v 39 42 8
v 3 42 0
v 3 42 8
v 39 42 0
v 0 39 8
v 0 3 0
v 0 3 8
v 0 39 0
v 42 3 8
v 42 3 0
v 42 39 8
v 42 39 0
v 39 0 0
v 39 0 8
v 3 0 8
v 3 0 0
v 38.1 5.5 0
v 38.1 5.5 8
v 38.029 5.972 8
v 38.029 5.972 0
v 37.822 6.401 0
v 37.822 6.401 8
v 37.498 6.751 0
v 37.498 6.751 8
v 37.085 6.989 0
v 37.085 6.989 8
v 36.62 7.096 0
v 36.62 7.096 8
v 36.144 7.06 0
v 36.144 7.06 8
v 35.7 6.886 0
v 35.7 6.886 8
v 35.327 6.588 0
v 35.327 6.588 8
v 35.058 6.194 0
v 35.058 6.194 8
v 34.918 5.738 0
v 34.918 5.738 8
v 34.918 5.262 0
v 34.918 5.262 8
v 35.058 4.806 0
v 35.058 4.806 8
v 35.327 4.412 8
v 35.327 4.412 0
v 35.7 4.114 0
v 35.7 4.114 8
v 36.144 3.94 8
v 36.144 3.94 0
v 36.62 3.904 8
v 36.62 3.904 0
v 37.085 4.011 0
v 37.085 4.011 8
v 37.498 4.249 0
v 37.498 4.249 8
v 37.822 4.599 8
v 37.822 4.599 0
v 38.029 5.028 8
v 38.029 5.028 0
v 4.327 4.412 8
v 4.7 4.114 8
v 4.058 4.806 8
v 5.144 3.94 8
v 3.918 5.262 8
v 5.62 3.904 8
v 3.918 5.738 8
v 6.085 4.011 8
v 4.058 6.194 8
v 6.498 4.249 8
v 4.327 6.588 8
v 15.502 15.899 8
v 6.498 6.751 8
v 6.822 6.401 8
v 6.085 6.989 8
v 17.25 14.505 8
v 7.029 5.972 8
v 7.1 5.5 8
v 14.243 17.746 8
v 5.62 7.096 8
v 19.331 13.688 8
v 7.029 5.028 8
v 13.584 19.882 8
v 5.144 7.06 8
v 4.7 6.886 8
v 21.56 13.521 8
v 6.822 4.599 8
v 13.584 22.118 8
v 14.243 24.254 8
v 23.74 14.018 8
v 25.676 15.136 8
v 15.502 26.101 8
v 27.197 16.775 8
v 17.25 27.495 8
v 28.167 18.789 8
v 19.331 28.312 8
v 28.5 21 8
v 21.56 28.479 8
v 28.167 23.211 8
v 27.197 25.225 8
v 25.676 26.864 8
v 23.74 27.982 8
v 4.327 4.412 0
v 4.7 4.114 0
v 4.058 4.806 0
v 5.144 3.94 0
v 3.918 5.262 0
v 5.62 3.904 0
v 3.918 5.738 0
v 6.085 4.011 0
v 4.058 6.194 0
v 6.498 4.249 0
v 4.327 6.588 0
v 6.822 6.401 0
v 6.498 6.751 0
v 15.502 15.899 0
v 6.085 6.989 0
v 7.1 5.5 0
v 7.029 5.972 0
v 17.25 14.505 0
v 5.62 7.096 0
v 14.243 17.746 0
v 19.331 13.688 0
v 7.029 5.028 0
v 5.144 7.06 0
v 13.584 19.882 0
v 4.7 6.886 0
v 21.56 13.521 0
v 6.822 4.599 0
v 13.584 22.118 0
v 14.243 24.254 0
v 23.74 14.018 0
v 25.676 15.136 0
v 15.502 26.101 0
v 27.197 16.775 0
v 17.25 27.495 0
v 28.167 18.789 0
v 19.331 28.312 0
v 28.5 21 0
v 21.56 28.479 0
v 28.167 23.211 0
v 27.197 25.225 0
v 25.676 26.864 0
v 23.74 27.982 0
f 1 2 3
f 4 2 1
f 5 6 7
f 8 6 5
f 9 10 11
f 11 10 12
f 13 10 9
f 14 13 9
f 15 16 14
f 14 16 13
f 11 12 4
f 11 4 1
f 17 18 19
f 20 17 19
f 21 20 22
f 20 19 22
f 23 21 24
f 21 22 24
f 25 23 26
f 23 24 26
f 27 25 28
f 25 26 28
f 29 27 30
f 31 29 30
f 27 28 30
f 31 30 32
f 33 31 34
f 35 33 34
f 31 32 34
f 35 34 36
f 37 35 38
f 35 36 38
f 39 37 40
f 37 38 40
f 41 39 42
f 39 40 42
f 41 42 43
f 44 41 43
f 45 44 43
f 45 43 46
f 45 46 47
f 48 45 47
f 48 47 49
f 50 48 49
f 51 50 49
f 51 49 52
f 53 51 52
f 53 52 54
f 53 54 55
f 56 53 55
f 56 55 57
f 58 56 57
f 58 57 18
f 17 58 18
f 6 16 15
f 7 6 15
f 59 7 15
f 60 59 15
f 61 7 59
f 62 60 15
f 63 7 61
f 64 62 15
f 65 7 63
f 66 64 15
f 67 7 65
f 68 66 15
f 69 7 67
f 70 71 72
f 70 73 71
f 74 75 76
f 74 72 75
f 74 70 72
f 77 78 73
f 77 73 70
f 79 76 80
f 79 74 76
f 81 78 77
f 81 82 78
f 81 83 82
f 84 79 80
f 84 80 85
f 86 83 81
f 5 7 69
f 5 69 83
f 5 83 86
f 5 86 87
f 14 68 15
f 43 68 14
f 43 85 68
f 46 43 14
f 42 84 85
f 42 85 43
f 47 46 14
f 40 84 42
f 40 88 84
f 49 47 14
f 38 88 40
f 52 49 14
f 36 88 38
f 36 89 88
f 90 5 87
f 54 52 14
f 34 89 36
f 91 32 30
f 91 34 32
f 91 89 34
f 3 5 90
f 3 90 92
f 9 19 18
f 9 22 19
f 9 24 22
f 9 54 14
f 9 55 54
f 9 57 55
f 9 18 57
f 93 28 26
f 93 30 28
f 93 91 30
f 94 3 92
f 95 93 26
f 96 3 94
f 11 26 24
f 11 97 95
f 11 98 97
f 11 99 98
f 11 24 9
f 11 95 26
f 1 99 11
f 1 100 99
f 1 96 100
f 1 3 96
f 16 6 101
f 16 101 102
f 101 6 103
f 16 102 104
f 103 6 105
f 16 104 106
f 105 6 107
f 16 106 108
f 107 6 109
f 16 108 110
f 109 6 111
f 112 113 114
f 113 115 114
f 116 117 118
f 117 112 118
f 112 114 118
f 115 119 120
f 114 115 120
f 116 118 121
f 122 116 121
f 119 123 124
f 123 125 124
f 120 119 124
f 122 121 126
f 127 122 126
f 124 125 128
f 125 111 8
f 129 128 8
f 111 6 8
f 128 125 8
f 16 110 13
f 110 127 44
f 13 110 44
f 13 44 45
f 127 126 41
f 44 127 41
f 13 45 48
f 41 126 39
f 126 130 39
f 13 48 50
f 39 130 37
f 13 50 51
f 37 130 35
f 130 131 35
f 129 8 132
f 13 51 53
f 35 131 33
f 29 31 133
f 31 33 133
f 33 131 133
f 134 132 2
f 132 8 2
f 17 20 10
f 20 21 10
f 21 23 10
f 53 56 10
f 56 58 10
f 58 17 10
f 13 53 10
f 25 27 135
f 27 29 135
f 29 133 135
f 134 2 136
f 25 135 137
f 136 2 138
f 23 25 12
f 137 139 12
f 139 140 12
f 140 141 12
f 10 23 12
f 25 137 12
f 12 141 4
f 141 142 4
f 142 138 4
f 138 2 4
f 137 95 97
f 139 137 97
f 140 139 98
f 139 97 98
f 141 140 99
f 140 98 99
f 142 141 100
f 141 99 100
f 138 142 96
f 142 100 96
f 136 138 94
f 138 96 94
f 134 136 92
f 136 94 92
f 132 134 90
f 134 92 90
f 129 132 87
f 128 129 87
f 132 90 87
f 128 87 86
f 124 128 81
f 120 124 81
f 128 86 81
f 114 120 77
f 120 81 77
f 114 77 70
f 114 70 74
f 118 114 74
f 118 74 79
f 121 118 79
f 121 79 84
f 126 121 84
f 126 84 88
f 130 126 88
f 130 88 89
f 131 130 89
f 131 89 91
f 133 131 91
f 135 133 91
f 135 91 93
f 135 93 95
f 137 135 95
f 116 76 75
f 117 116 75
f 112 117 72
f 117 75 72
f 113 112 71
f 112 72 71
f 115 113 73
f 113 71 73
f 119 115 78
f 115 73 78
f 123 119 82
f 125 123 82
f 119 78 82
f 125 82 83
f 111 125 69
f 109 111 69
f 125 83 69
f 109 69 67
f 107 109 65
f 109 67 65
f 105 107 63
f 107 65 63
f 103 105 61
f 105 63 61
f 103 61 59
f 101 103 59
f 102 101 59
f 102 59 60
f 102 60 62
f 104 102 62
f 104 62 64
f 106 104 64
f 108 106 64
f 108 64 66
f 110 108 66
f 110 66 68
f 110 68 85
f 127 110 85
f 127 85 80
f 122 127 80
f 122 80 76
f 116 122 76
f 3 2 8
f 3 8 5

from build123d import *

# Parameters (mm, degrees)
SKETCH1_W           = 42
SKETCH1_H           = 42
BOSS_EXTRUDE1_DEPTH = 8
SKETCH2_R           = 1.6
SKETCH2_R_2         = 7.5
CUT_EXTRUDE1_DEPTH  = 9
CHAMFER1_SIZE       = 3


with BuildPart() as part:
    # Sketch1 → Boss-Extrude1 (new body)
    with BuildSketch(Plane.XY):
        with Locations((21, 21)):
            Rectangle(SKETCH1_W, SKETCH1_H)
    extrude(amount=BOSS_EXTRUDE1_DEPTH)

    # Sketch2 → Cut-Extrude1 (cut)
    with BuildSketch(Plane.XY.offset(8)):
        with Locations((36.5, 5.5)):
            Circle(SKETCH2_R)
        with Locations((5.5, 5.5)):
            Circle(SKETCH2_R)
        with Locations((21, 21)):
            Circle(SKETCH2_R_2)
    extrude(amount=-CUT_EXTRUDE1_DEPTH, mode=Mode.SUBTRACT)

    # Chamfer1
    chamfer1_edges = [part.edges().sort_by_distance(p)[0] for p in [
        (0, 42, 4),
        (42, 42, 4),
        (42, 0, 4),
        (0, 0, 4),
    ]]
    chamfer(chamfer1_edges, length=CHAMFER1_SIZE)


solid = part.part
